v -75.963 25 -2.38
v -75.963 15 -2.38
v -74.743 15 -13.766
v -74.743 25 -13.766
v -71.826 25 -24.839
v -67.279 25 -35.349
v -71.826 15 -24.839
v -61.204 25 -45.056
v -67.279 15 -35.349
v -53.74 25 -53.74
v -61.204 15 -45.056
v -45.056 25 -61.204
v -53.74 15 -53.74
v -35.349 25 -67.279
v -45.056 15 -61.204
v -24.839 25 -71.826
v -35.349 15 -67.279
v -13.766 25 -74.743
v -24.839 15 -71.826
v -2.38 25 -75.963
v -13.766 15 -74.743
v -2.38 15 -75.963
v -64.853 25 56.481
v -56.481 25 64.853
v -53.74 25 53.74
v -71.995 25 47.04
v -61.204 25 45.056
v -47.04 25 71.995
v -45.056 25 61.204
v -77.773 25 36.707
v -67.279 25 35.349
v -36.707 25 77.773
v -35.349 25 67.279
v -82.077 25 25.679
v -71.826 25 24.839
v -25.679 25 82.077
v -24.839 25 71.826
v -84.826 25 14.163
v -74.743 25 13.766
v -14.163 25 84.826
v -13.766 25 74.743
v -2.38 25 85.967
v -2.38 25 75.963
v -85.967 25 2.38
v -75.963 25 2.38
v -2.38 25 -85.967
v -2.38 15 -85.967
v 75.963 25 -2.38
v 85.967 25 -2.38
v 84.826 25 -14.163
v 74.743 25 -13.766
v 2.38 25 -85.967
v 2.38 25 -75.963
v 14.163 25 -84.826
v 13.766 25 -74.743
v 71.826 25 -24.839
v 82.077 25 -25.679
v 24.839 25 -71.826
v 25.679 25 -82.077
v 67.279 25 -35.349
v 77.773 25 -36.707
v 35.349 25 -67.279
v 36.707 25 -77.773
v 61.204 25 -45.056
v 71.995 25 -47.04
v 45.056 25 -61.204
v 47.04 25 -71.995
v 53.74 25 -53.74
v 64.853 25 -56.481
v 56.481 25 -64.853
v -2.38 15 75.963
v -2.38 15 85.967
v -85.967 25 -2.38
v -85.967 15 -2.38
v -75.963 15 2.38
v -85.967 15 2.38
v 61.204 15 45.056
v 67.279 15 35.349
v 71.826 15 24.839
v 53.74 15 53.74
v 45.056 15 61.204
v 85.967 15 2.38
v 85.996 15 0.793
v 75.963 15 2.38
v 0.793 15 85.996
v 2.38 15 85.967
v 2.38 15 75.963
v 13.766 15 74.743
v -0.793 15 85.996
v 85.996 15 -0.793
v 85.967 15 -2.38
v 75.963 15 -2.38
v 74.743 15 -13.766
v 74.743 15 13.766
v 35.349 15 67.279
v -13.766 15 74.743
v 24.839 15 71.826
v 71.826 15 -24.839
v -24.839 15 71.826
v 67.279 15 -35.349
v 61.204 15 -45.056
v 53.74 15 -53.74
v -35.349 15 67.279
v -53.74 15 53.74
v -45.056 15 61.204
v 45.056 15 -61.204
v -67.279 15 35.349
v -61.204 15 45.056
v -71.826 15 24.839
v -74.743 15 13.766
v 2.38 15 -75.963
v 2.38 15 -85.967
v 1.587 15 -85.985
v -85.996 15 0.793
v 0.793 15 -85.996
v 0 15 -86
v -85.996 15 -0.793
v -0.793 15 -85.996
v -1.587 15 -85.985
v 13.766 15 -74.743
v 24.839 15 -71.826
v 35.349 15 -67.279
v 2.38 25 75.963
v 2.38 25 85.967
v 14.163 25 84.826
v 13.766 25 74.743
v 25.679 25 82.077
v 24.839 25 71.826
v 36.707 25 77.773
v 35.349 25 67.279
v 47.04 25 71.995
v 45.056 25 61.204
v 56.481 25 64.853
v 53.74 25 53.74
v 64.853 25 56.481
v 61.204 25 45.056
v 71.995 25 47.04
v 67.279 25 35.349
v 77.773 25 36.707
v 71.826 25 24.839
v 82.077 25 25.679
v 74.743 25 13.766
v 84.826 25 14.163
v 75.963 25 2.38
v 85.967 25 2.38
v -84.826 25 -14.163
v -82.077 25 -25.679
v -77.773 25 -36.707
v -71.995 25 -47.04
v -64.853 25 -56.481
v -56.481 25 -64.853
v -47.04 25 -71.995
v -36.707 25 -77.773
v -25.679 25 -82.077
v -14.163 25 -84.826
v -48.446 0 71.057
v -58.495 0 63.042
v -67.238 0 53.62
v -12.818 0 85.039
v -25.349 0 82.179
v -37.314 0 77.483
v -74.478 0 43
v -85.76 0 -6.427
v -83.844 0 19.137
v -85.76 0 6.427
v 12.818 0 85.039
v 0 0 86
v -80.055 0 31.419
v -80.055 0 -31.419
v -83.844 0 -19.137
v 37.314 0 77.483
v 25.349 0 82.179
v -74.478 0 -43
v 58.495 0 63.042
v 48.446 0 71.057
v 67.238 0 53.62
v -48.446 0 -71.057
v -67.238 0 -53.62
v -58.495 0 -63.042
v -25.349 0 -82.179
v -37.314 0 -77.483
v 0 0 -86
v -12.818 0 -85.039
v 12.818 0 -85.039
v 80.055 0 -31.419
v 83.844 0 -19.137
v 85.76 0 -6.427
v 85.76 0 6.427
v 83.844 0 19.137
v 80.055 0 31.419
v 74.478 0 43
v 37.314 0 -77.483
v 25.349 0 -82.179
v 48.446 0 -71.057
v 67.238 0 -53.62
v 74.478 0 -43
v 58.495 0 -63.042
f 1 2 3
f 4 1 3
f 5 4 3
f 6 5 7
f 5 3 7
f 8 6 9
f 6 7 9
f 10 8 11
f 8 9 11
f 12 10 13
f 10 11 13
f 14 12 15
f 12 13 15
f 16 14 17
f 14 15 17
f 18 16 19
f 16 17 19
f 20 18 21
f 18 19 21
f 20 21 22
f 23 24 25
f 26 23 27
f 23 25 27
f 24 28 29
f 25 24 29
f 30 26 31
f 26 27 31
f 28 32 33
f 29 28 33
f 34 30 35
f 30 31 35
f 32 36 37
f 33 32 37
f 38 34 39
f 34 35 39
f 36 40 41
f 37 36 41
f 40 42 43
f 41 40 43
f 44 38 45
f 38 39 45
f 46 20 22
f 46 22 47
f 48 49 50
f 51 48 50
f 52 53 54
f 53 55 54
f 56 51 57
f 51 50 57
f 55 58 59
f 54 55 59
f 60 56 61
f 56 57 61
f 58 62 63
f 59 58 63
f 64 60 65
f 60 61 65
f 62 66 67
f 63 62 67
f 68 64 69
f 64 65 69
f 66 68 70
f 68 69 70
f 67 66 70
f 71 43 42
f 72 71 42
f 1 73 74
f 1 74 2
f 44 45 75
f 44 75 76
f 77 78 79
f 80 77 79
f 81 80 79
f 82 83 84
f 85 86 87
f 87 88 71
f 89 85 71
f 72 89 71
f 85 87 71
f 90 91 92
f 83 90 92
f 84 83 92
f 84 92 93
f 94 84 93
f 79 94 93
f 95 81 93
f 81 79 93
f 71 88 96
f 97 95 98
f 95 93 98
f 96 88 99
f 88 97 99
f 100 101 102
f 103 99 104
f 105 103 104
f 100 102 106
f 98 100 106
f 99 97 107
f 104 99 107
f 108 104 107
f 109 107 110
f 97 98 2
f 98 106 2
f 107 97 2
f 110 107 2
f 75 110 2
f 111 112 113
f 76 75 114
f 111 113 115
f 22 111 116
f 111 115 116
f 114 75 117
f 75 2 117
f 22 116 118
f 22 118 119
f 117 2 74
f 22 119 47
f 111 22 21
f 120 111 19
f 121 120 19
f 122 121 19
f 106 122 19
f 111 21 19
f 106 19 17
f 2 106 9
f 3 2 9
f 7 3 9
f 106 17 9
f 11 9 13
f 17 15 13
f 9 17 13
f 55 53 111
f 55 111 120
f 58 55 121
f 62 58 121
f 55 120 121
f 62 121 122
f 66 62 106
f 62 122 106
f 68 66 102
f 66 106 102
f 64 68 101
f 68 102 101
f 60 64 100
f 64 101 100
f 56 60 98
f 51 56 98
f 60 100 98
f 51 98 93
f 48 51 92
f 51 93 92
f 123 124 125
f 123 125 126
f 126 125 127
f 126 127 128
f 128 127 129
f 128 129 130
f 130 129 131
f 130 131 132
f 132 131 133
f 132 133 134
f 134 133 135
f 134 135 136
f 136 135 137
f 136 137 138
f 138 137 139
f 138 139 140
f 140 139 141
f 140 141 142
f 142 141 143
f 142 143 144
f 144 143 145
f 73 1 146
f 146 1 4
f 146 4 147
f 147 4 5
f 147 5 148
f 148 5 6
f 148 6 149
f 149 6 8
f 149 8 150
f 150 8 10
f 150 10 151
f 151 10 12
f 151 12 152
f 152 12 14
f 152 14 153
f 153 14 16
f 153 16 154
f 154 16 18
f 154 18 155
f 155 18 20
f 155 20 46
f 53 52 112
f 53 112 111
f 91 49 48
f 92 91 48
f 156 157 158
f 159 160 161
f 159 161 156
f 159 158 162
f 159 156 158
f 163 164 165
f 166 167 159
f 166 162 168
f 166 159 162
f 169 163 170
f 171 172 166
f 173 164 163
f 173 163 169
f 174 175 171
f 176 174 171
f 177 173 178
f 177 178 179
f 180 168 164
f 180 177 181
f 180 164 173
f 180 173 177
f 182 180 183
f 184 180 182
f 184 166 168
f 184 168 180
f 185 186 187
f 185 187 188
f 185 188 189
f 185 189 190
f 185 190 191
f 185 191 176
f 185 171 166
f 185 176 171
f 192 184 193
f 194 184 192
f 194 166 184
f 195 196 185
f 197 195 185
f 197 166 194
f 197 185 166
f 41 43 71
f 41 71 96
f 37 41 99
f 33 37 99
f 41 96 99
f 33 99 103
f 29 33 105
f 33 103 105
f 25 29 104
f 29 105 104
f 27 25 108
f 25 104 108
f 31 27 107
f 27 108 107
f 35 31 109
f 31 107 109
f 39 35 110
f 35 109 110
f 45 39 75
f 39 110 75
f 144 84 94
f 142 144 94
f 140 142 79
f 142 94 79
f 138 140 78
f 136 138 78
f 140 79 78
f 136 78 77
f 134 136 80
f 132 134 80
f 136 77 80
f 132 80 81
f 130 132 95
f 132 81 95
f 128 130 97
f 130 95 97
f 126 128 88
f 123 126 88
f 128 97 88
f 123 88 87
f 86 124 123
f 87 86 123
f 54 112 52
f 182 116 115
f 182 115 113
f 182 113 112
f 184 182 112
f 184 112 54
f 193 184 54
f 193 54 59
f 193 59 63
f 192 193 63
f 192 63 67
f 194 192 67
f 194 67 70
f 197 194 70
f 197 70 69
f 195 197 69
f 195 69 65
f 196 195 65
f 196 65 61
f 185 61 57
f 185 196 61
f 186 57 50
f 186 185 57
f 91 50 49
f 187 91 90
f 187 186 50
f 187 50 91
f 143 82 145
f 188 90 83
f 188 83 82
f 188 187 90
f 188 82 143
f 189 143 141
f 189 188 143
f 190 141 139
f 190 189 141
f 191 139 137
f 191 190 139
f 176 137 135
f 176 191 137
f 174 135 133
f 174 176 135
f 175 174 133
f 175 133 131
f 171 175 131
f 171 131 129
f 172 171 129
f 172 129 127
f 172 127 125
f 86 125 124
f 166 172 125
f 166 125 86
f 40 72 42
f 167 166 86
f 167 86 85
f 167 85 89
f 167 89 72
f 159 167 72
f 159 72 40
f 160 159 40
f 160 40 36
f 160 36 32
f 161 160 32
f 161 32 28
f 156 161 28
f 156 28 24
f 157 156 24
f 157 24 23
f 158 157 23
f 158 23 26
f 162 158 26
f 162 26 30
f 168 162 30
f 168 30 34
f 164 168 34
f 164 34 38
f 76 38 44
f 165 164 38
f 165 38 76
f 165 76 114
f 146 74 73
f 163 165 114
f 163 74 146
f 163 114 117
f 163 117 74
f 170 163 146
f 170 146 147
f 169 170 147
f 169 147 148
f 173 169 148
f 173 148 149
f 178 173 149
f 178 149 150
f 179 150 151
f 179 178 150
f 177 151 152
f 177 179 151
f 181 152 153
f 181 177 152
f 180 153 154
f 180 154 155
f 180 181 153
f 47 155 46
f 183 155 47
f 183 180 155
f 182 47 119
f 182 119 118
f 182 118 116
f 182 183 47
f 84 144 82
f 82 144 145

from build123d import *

# Parameters (mm, degrees)
SKETCH2_R           = 76
BOSS_EXTRUDE1_DEPTH = 15
SKETCH4_R           = 86
SKETCH4_R_2         = 76
BOSS_EXTRUDE2_DEPTH = 25
CUT_EXTRUDE1_DEPTH  = 10


with BuildPart() as part:
    # Sketch2 → Boss-Extrude1 (new body)
    with BuildSketch(Plane(origin=(0, 0, 0), x_dir=(1, 0, 0), z_dir=(0, 1, 0))):
        with Locations(Location((0, 0, 0), (0, 0, 270))):
            Circle(SKETCH2_R)
    extrude(amount=BOSS_EXTRUDE1_DEPTH)

    # Sketch4 → Boss-Extrude2 (add)
    with BuildSketch(Plane(origin=(0, 0, 0), x_dir=(-1, 0, 0), z_dir=(0, -1, 0))):
        with Locations(Location((0, 0, 0), (0, 0, 90))):
            Circle(SKETCH4_R)
        with Locations(Location((0, 0, 0), (0, 0, 90))):
            Circle(SKETCH4_R_2, mode=Mode.SUBTRACT)
    extrude(amount=-BOSS_EXTRUDE2_DEPTH)

    # Sketch5 → Cut-Extrude1 (cut)
    with BuildSketch(Plane(origin=(0, 25, 0), x_dir=(1, 0, 0), z_dir=(0, 1, 0))):
        Polygon((86, 0), (86, 2.38), (75.161889678, 2.38), (75.161889678, -2.38), (86.243553227, -2.38), align=None)
        Polygon((-86, 0), (-86, 2.38), (-75.22208349, 2.38), (-75.22208349, -2.38), (-86.457059311, -2.38), align=None)
        Polygon((0, 86), (2.38, 86), (2.38, 74.13986027), (-2.38, 74.13986027), (-2.38, 86.447056085), align=None)
        Polygon((0, -86), (2.38, -86), (2.38, -74.817551039), (-2.38, -74.817551039), (-2.38, -87.761718776), align=None)
    extrude(amount=-CUT_EXTRUDE1_DEPTH, mode=Mode.SUBTRACT)


solid = part.part
